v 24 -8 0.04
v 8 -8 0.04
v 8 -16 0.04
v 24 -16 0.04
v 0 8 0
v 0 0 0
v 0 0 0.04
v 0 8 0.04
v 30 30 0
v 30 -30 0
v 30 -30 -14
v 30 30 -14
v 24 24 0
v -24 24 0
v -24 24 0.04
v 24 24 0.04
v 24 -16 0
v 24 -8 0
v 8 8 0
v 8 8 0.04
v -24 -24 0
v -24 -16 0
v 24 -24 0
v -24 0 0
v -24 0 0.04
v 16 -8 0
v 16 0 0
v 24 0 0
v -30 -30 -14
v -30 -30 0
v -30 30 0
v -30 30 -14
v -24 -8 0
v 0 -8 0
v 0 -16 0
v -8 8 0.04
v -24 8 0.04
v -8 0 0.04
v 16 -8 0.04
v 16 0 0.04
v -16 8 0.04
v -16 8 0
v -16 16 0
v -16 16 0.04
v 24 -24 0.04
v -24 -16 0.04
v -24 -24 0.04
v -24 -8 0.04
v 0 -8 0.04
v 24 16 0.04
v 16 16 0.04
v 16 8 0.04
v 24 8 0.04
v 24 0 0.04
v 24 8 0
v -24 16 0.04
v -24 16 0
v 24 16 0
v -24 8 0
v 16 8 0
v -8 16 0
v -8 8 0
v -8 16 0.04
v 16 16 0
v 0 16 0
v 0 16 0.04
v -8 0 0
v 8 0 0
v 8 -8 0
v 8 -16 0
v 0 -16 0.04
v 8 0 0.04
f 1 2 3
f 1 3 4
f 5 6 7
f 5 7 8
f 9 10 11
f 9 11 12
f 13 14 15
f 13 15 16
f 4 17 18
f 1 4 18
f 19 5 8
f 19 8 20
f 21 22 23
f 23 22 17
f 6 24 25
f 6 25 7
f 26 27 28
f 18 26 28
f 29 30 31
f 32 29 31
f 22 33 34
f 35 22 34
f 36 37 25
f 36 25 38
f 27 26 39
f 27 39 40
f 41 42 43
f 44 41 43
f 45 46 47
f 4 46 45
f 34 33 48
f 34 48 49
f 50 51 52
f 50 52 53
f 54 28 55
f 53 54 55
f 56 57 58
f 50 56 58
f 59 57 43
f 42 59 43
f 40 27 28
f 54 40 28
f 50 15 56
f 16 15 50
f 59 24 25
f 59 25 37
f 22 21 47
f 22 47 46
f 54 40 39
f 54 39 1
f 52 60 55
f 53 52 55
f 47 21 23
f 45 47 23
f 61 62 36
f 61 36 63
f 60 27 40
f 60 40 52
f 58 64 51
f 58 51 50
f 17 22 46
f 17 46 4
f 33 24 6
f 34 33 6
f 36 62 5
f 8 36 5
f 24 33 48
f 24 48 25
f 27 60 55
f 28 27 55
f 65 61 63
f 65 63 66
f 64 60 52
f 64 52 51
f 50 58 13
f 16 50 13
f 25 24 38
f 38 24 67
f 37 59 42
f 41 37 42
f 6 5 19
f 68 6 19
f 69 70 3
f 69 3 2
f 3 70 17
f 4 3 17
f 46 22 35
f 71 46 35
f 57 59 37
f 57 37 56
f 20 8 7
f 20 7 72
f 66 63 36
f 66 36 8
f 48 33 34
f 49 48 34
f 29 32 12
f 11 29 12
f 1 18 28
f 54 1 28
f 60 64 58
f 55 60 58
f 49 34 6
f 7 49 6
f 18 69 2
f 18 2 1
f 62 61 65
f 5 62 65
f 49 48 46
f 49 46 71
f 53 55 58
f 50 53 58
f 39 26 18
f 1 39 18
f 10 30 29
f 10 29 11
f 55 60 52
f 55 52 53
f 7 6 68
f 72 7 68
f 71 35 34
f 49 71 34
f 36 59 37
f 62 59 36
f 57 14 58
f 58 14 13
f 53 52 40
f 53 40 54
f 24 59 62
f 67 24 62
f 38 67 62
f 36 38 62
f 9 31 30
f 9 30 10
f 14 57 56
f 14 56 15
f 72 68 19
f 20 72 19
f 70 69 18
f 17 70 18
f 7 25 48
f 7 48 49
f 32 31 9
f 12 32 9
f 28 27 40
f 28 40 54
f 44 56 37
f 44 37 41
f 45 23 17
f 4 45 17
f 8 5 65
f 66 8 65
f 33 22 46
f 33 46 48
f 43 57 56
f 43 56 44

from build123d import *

# Parameters (mm, degrees)
SKETCH_1_W                     = 60
SKETCH_1_H                     = 60
COPLANAR_SUPPORT60X60X14_DEPTH = 14
SKETCH_2_W                     = 48
SKETCH_2_H                     = 8
ID0_ROW0_DEPTH                 = 0.04
SKETCH_3_W                     = 8
SKETCH_3_H                     = 8
ID0_ROW1_DEPTH                 = 0.04
ID0_ROW1_2_DEPTH               = 0.04
ID0_ROW1_3_DEPTH               = 0.04
SKETCH_4_W                     = 16
SKETCH_4_H                     = 8
ID0_ROW2_DEPTH                 = 0.04
SKETCH_4_W_2                   = 8
ID0_ROW2_2_DEPTH               = 0.04
ID0_ROW2_3_DEPTH               = 0.04
SKETCH_5_W                     = 24
SKETCH_5_H                     = 8
ID0_ROW3_DEPTH                 = 0.04
SKETCH_5_W_2                   = 8
ID0_ROW3_2_DEPTH               = 0.04
SKETCH_6_W                     = 24
SKETCH_6_H                     = 8
ID0_ROW4_DEPTH                 = 0.04
SKETCH_6_W_2                   = 16
ID0_ROW4_2_DEPTH               = 0.04
SKETCH_7_W                     = 48
SKETCH_7_H                     = 8
ID0_ROW5_DEPTH                 = 0.04


with BuildPart() as part:
    # 草图1 → Coplanar_support60x60x14 (new body)
    with BuildSketch(Plane.XY):
        Rectangle(SKETCH_1_W, SKETCH_1_H)
    extrude(amount=-COPLANAR_SUPPORT60X60X14_DEPTH)


with BuildPart() as body_2:
    # 草图2 → ID0_row0 (new body)
    with BuildSketch(Plane.XY):
        with Locations((0, 20)):
            Rectangle(SKETCH_2_W, SKETCH_2_H)
    extrude(amount=ID0_ROW0_DEPTH)


with BuildPart() as body_3:
    # 草图3 → ID0_row1 (new body)
    with BuildSketch(Plane.XY):
        with Locations((-20, 12)):
            Rectangle(SKETCH_3_W, SKETCH_3_H)
    extrude(amount=ID0_ROW1_DEPTH)


with BuildPart() as body_4:
    # 草图3 → ID0_row1 2 (new body)
    with BuildSketch(Plane.XY):
        with Locations((-4, 12)):
            Rectangle(SKETCH_3_W, SKETCH_3_H)
    extrude(amount=ID0_ROW1_2_DEPTH)


with BuildPart() as body_5:
    # 草图3 → ID0_row1 3 (new body)
    with BuildSketch(Plane.XY):
        with Locations((20, 12)):
            Rectangle(SKETCH_3_W, SKETCH_3_H)
    extrude(amount=ID0_ROW1_3_DEPTH)


with BuildPart() as body_6:
    # 草图4 → ID0_row2 (new body)
    with BuildSketch(Plane.XY):
        with Locations((-16, 4)):
            Rectangle(SKETCH_4_W, SKETCH_4_H)
    extrude(amount=ID0_ROW2_DEPTH)


with BuildPart() as body_7:
    # 草图4 → ID0_row2 2 (new body)
    with BuildSketch(Plane.XY):
        with Locations((4, 4)):
            Rectangle(SKETCH_4_W_2, SKETCH_4_H)
    extrude(amount=ID0_ROW2_2_DEPTH)


with BuildPart() as body_8:
    # 草图4 → ID0_row2 3 (new body)
    with BuildSketch(Plane.XY):
        with Locations((20, 4)):
            Rectangle(SKETCH_4_W_2, SKETCH_4_H)
    extrude(amount=ID0_ROW2_3_DEPTH)


with BuildPart() as body_9:
    # 草图5 → ID0_row3 (new body)
    with BuildSketch(Plane.XY):
        with Locations((-12, -4)):
            Rectangle(SKETCH_5_W, SKETCH_5_H)
    extrude(amount=ID0_ROW3_DEPTH)


with BuildPart() as body_10:
    # 草图5 → ID0_row3 2 (new body)
    with BuildSketch(Plane.XY):
        with Locations((20, -4)):
            Rectangle(SKETCH_5_W_2, SKETCH_5_H)
    extrude(amount=ID0_ROW3_2_DEPTH)


with BuildPart() as body_11:
    # 草图6 → ID0_row4 (new body)
    with BuildSketch(Plane.XY):
        with Locations((-12, -12)):
            Rectangle(SKETCH_6_W, SKETCH_6_H)
    extrude(amount=ID0_ROW4_DEPTH)


with BuildPart() as body_12:
    # 草图6 → ID0_row4 2 (new body)
    with BuildSketch(Plane.XY):
        with Locations((16, -12)):
            Rectangle(SKETCH_6_W_2, SKETCH_6_H)
    extrude(amount=ID0_ROW4_2_DEPTH)


with BuildPart() as body_13:
    # 草图7 → ID0_row5 (new body)
    with BuildSketch(Plane.XY):
        with Locations((0, -20)):
            Rectangle(SKETCH_7_W, SKETCH_7_H)
    extrude(amount=ID0_ROW5_DEPTH)


solid = Compound([part.part, body_2.part, body_3.part, body_4.part, body_5.part, body_6.part, body_7.part, body_8.part, body_9.part, body_10.part, body_11.part, body_12.part, body_13.part])
